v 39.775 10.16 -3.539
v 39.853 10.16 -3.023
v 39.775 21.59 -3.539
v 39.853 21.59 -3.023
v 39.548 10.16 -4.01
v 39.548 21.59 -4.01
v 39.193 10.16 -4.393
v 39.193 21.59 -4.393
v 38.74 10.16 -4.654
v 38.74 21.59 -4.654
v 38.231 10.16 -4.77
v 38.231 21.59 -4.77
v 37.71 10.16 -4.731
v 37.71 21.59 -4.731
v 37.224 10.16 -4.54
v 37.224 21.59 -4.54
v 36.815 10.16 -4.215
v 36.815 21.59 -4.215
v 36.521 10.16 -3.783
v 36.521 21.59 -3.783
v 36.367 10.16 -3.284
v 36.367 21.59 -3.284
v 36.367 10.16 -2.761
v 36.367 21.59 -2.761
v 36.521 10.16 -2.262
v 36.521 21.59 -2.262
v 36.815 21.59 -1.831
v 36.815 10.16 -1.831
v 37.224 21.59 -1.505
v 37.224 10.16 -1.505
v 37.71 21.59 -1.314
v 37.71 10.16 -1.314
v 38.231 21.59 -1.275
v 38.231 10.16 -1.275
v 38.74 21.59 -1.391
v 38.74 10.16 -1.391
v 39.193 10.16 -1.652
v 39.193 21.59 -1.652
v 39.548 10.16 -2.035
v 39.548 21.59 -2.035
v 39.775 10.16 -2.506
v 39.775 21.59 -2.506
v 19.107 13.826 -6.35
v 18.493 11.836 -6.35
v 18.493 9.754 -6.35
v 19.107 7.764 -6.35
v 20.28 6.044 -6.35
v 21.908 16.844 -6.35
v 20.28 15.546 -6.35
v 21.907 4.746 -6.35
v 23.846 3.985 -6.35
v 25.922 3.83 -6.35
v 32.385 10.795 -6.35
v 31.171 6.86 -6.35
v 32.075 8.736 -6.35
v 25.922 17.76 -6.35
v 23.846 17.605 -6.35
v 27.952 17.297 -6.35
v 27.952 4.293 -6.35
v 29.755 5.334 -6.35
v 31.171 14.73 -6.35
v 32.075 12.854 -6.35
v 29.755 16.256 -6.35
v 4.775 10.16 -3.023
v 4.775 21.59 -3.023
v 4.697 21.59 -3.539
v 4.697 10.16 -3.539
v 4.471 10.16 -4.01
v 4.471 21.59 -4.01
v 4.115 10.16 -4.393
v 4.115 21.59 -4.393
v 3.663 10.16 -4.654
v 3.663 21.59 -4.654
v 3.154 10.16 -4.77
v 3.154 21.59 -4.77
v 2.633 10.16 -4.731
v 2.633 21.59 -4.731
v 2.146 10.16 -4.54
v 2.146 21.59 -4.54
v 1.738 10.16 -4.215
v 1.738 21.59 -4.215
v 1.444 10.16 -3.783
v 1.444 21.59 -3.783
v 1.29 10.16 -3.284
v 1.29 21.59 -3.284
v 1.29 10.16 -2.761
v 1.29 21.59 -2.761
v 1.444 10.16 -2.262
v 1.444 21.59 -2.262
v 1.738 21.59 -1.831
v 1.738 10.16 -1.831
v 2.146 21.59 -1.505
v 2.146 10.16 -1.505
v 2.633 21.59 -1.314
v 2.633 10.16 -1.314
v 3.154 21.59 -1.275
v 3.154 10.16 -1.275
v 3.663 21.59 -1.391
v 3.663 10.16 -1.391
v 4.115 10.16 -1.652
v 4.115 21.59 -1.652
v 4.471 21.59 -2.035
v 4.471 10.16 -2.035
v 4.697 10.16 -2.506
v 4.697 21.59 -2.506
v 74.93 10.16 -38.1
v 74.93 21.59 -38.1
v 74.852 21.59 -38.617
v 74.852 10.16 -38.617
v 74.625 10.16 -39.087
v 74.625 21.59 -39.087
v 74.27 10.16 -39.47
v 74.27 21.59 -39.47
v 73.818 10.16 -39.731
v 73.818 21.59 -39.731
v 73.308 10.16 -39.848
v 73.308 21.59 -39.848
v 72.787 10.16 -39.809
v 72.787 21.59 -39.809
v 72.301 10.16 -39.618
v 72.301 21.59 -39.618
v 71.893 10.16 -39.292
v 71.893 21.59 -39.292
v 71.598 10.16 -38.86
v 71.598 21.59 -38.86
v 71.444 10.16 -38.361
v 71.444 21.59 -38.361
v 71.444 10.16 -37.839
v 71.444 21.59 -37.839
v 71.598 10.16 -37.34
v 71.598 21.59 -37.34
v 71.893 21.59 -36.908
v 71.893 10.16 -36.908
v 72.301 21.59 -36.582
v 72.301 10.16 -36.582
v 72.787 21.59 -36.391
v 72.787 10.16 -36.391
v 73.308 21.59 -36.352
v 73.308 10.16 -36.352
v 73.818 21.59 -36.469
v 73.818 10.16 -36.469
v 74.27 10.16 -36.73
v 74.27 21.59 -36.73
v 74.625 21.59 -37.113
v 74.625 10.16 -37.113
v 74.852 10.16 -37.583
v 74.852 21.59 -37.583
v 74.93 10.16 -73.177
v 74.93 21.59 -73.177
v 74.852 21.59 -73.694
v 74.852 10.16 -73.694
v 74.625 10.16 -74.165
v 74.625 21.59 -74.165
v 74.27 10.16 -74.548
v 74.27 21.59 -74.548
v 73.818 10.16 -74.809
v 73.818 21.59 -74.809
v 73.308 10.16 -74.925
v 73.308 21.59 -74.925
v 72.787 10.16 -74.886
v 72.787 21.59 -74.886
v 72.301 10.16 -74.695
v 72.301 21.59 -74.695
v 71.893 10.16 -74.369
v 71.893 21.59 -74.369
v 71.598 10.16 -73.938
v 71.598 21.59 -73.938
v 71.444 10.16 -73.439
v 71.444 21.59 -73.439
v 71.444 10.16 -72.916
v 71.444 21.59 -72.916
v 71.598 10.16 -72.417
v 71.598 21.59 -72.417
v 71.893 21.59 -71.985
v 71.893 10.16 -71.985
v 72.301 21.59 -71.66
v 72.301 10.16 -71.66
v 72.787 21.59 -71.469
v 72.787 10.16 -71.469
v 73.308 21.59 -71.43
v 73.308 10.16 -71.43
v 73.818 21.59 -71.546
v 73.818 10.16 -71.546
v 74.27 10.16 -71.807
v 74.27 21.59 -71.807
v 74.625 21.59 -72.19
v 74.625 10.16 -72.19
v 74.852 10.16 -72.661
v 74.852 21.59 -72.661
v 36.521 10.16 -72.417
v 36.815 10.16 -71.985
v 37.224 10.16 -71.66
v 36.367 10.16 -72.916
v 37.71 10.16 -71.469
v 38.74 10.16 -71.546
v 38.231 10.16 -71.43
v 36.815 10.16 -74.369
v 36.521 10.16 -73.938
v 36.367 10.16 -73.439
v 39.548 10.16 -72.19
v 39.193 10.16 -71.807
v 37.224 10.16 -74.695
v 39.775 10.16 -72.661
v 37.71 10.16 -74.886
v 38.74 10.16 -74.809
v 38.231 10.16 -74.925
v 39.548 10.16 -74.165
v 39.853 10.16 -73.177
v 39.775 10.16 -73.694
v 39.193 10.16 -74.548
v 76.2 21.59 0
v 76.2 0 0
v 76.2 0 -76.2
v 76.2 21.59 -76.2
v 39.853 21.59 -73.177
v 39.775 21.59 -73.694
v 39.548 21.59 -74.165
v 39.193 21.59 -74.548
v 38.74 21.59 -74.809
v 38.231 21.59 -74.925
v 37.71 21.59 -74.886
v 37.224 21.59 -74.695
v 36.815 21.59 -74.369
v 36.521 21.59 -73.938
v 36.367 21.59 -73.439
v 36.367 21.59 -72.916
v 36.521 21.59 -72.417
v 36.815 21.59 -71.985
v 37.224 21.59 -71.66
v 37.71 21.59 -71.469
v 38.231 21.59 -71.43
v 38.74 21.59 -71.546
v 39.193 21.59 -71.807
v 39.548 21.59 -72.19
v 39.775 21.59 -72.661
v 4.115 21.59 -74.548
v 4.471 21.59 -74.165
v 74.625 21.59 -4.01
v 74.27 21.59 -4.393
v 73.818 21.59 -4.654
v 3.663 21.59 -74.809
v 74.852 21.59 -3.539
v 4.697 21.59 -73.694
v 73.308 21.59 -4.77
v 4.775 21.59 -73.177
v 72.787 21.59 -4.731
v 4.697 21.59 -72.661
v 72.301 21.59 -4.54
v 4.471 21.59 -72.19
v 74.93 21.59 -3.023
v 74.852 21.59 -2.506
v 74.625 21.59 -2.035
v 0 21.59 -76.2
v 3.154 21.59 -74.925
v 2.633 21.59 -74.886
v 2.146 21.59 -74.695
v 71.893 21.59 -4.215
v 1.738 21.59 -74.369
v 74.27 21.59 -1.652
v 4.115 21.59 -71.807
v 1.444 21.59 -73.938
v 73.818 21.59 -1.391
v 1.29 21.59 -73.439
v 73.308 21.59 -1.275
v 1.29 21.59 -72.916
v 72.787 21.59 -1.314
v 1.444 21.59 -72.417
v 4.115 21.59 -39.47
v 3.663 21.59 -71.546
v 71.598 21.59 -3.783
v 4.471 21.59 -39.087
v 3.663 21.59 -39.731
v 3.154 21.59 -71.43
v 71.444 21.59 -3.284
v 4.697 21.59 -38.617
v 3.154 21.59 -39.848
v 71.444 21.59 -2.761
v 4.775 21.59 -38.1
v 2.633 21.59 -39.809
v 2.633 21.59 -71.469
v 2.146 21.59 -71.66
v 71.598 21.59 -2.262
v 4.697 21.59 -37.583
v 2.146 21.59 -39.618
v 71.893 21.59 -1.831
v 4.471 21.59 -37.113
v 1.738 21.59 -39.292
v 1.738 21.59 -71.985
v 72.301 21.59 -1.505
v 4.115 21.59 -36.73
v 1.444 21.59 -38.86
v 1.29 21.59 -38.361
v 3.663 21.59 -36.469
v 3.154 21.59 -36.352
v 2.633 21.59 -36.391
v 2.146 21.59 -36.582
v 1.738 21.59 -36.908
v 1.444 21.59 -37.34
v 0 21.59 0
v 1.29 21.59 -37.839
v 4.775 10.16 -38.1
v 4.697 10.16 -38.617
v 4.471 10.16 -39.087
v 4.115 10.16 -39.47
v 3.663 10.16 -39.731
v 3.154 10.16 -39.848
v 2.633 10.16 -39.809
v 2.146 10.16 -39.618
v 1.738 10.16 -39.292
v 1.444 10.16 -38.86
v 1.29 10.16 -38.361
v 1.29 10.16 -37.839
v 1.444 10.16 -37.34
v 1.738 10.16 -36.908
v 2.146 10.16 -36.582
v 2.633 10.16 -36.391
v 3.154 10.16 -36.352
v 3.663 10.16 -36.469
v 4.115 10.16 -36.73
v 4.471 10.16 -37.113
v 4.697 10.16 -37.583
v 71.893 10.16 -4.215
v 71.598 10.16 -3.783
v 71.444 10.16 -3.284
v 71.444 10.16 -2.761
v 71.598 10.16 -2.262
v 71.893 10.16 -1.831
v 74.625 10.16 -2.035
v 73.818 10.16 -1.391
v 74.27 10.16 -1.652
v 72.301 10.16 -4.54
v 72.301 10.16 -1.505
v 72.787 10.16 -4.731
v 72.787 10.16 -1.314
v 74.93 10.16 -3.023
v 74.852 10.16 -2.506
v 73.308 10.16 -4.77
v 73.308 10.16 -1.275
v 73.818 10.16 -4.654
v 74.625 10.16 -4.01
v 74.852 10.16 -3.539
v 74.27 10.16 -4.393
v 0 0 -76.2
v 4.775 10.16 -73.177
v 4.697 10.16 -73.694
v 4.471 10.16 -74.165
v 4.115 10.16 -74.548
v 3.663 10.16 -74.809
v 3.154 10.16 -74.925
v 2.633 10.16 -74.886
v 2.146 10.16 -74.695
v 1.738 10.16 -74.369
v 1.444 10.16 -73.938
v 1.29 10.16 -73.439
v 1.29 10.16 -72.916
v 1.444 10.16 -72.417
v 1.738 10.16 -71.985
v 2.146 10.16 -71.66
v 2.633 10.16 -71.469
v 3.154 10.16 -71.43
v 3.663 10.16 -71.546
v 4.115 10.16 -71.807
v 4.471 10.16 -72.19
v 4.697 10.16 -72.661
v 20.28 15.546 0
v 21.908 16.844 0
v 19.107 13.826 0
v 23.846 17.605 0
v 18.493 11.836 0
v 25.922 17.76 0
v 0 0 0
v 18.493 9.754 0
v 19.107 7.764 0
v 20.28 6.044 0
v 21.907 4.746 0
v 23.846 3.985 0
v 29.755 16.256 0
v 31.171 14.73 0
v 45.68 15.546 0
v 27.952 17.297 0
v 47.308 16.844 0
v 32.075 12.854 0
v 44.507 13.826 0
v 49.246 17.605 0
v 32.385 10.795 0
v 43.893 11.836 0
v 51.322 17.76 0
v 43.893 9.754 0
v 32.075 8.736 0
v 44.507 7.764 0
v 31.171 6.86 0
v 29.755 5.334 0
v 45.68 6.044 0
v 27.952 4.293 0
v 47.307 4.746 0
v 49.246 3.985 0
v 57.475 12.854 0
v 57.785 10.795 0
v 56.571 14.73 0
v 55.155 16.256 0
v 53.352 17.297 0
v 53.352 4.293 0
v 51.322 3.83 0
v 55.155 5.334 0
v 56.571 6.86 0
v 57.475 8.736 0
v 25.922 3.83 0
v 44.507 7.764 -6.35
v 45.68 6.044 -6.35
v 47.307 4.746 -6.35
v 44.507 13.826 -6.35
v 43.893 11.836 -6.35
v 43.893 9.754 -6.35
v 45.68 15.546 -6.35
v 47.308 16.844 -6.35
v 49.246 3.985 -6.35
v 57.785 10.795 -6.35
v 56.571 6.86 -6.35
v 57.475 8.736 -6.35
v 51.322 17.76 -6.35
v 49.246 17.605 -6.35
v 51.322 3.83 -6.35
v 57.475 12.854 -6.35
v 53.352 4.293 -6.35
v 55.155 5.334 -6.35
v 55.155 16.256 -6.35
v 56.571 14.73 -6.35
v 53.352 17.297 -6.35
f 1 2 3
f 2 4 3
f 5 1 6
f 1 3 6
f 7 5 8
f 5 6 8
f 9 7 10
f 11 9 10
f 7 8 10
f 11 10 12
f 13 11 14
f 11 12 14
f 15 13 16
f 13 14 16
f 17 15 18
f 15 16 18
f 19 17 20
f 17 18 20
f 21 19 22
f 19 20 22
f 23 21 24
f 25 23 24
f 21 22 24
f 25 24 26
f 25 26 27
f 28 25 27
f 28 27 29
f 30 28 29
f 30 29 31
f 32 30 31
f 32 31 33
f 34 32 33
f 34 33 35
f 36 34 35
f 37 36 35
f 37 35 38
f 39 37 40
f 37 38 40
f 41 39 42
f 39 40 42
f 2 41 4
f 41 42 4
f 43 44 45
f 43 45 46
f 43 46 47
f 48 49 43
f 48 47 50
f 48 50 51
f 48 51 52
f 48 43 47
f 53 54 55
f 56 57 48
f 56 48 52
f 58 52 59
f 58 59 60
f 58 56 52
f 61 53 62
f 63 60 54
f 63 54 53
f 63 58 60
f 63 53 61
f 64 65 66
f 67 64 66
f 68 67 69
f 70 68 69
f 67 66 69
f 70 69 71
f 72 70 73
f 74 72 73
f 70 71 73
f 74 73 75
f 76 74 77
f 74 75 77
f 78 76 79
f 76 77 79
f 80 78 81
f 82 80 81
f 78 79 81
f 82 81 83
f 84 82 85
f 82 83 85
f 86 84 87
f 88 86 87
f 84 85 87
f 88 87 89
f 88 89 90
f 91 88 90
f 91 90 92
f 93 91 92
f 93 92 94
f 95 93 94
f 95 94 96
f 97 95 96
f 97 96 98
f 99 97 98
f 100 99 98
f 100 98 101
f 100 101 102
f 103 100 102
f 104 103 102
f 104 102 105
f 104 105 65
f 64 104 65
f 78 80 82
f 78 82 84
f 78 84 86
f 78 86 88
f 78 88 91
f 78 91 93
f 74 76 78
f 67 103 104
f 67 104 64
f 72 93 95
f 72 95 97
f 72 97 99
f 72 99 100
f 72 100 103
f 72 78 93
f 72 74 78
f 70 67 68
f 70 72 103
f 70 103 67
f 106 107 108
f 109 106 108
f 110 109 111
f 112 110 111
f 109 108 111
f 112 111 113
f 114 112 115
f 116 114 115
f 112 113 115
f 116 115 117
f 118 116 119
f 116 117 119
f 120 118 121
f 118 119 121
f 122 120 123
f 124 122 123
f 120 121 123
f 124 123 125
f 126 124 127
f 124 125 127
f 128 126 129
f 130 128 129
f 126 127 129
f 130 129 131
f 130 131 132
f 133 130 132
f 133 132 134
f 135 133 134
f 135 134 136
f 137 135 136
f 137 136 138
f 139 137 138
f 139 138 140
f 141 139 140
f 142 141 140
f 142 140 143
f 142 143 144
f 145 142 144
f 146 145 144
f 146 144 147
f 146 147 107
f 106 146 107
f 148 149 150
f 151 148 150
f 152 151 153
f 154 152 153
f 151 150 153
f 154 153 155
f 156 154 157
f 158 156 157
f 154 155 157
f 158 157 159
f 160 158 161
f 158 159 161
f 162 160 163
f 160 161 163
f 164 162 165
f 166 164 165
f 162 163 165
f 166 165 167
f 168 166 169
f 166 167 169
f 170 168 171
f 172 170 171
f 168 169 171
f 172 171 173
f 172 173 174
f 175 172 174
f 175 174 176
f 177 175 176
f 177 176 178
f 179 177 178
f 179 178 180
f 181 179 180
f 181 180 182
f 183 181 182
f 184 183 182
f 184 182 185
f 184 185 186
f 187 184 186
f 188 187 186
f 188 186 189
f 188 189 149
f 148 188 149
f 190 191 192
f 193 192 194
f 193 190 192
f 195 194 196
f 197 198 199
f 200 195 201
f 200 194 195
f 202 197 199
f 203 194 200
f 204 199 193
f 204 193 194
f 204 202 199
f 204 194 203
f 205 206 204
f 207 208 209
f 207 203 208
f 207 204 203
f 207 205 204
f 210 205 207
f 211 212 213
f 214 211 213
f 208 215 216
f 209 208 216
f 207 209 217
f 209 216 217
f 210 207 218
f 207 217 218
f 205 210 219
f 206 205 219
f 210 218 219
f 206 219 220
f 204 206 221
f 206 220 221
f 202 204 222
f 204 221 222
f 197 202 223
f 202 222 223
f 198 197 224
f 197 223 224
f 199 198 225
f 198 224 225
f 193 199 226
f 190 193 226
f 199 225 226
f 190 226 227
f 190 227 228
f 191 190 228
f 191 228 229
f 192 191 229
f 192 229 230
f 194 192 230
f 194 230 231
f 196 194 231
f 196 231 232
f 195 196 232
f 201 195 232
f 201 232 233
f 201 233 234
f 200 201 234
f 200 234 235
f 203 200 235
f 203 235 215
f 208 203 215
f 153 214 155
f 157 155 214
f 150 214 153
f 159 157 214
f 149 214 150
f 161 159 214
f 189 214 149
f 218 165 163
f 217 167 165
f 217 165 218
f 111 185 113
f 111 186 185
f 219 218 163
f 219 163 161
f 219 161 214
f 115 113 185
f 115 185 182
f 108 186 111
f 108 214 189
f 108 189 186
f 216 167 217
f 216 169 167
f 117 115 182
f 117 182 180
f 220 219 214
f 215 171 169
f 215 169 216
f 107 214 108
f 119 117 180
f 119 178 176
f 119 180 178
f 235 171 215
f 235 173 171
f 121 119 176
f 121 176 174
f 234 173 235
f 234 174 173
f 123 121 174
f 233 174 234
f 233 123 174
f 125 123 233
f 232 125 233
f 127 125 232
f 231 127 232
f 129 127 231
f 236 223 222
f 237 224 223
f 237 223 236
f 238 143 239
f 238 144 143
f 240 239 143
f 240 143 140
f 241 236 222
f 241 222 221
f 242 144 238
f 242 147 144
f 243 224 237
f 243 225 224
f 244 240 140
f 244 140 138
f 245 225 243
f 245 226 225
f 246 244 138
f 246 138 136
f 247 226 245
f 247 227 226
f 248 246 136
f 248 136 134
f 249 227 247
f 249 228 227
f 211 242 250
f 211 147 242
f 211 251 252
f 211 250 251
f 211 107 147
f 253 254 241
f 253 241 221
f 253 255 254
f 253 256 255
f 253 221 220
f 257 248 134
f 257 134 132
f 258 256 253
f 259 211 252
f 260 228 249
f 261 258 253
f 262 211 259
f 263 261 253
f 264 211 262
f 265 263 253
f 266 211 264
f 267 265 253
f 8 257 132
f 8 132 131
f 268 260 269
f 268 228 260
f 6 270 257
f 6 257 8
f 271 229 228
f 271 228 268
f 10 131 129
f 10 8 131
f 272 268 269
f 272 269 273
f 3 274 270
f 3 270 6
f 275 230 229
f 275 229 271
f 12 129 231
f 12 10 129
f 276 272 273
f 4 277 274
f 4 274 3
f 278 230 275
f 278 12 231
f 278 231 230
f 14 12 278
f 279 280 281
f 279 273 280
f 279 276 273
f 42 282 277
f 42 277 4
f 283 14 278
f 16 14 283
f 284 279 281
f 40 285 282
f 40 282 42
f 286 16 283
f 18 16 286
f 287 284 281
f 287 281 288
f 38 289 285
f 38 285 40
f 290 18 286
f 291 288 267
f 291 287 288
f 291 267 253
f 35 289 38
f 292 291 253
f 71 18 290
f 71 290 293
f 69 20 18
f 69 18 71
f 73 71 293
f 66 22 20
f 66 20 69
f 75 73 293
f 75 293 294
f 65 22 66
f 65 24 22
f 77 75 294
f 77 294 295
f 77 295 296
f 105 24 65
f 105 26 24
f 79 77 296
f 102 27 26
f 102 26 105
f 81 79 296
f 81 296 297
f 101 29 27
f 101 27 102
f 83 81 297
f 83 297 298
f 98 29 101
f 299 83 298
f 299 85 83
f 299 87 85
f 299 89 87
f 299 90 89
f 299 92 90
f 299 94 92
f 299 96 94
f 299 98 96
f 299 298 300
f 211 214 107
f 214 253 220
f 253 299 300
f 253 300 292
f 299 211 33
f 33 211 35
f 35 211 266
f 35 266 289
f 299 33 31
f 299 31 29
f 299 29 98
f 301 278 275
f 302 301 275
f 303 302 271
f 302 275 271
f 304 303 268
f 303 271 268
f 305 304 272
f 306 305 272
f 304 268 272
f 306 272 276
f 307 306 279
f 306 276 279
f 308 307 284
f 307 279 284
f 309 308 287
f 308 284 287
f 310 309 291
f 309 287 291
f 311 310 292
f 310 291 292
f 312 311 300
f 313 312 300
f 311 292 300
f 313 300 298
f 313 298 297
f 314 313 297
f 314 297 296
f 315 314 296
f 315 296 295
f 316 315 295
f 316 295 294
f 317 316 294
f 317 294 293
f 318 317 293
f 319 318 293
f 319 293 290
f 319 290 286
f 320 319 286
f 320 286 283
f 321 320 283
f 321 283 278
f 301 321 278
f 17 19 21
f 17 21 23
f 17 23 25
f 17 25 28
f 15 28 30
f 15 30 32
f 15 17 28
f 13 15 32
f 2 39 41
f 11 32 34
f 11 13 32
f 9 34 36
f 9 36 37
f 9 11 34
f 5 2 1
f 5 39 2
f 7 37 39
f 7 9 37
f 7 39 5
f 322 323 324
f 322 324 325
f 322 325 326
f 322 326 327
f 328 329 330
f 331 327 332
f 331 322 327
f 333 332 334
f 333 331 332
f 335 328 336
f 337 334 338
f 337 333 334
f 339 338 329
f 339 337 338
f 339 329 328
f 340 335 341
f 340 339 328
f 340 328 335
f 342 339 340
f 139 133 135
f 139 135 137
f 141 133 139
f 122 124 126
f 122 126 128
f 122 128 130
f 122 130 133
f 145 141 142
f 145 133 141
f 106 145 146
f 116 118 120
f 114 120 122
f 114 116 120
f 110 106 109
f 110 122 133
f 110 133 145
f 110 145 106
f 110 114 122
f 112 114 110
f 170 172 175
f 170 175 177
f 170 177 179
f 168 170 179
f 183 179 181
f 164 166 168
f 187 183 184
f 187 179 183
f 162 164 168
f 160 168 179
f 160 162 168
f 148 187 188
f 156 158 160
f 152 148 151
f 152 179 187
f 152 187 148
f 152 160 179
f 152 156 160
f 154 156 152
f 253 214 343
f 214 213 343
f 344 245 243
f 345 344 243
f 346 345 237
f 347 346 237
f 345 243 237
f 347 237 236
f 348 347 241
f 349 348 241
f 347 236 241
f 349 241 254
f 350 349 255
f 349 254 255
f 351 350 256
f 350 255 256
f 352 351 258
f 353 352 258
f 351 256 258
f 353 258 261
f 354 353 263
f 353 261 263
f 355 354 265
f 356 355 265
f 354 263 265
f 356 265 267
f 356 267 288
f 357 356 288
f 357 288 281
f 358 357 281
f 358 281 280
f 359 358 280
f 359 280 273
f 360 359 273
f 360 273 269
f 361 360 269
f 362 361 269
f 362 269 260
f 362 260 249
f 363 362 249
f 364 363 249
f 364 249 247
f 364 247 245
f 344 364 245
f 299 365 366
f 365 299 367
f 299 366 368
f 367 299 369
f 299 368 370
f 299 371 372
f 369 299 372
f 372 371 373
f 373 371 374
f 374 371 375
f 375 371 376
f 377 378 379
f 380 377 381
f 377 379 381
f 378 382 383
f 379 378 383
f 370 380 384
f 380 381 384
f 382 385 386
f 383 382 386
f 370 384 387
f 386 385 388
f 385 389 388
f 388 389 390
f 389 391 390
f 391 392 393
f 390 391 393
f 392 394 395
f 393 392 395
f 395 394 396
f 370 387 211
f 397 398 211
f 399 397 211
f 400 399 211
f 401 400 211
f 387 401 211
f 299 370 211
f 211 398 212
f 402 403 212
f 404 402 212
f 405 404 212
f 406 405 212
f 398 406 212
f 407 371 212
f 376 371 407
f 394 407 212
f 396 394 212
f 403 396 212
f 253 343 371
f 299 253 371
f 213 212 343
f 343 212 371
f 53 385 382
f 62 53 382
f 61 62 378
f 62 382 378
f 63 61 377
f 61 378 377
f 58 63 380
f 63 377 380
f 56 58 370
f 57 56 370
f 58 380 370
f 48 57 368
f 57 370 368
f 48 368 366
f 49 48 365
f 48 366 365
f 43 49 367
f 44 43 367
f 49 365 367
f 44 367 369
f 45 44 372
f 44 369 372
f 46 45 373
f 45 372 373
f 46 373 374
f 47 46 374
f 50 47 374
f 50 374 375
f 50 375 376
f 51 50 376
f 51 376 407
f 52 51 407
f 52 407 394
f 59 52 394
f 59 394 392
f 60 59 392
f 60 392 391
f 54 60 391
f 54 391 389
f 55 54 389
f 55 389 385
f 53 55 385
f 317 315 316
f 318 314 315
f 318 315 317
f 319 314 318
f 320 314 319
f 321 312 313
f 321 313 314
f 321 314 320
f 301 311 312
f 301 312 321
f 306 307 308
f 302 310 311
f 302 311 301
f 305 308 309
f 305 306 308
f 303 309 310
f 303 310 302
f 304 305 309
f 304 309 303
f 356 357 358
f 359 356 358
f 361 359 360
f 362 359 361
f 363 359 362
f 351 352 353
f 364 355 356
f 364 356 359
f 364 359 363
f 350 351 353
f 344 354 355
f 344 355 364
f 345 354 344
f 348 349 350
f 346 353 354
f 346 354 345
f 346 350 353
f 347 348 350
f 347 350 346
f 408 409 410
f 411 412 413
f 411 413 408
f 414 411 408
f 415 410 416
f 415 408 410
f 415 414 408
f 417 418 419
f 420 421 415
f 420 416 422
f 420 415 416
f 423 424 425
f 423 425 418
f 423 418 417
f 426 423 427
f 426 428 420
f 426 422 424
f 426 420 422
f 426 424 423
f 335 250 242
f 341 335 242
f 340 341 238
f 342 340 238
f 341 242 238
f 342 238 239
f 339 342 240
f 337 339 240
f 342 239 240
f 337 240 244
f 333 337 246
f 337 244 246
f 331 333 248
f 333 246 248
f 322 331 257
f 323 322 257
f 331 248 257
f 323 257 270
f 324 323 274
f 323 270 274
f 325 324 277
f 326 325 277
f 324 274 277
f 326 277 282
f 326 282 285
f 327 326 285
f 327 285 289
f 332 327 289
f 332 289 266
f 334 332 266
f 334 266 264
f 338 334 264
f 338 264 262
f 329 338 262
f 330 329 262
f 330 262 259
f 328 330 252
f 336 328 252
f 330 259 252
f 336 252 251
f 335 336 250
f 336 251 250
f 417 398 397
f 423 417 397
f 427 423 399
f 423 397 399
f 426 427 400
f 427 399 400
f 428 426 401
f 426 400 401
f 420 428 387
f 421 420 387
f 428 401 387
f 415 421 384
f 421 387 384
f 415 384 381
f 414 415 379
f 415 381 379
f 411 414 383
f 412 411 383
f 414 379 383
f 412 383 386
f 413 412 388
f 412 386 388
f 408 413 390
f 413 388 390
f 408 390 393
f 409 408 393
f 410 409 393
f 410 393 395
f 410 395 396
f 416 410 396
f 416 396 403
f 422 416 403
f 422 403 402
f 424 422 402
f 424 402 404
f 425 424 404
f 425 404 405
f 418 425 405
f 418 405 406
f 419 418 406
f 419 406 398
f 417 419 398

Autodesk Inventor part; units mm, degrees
ref_plane "YZ Plane" through (0, 0, 0) normal (1, 0, 0) x (0, 1, 0)
ref_plane "XZ Plane" through (0, 0, 0) normal (0, 1, 0) x (-1, 0, 0)
ref_plane "XY Plane" through (0, 0, 0) normal (0, 0, 1) x (1, 0, 0)
sketch "Sketch1" plane through (0, 0, 0) normal (0, 1, 0) x (-1, 0, 0)
  line L0 (0, 0) -> (-76.2, 0)
  line L1 (-76.2, 0) -> (-76.2, -76.2)
  line L2 (-76.2, -76.2) -> (0, -76.2)
  line L3 (0, -76.2) -> (0, 0)
  dimension "d0" = 76.2
  dimension "d1" = 76.2
extrude "Extrusion1" add sketch "Sketch1" along normal blind 21.59
sketch "Sketch2" plane through (0, 21.59, 0) normal (0, 1, 0) x (1, 0, 0)
  line L0 (76.2, 76.2) -> (0, 76.2) projected
  line L1 (38.1, 76.2) -> (38.1, 73.1774)
  line L2 (0, 76.2) -> (0, 0) projected
  line L3 (0, 38.1) -> (3.0226, 38.1)
  line L4 (0, 0) -> (76.2, 0) projected
  line L5 (38.1, 0) -> (38.1, 3.0226)
  line L6 (76.2, 0) -> (76.2, 76.2) projected
  line L7 (76.2, 38.1) -> (73.1774, 38.1)
  circle A0 centre (3.0226, 73.1774) radius 1.7526
  circle A1 centre (73.1774, 3.0226) radius 1.7526
  circle A2 centre (73.1774, 73.1774) radius 1.7526
  circle A3 centre (38.1, 3.0226) radius 1.7526
  circle A4 centre (3.0226, 38.1) radius 1.7526
  circle A5 centre (38.1, 73.1774) radius 1.7526
  circle A6 centre (3.0226, 3.0226) radius 1.7526
  circle A7 centre (73.1774, 38.1) radius 1.7526
  dimension "d5" = 3.0226
  dimension "d6" = 3.0226
  dimension "d7" = 3.0226
  dimension "d8" = 3.0226
  dimension "d9" = 3.5052
  dimension "d10" = 3.5052
  dimension "d11" = 3.5052
  dimension "d12" = 3.5052
  dimension "d13" = 3.5052
  dimension "d14" = 3.5052
  dimension "d15" = 3.5052
  dimension "d16" = 3.5052
extrude "Extrusion2" cut sketch "Sketch2" against normal blind 11.43 contours A5 | A4 | A3 | A7 | A0 | A1 | A2 | A6
sketch "Sketch3" plane through (0, 0, 0) normal (0, 0, 1) x (1, 0, 0)
  line L0 (0, 0) -> (0, 21.59) projected
  circle A0 centre (25.4, 10.795) radius 6.985
  circle A1 centre (50.8, 10.795) radius 6.985
  dimension "d21" = 13.97
  dimension "d22" = 13.97
extrude "Extrusion3" cut sketch "Sketch3" against normal blind 6.35
properties part number "water_block_top"
